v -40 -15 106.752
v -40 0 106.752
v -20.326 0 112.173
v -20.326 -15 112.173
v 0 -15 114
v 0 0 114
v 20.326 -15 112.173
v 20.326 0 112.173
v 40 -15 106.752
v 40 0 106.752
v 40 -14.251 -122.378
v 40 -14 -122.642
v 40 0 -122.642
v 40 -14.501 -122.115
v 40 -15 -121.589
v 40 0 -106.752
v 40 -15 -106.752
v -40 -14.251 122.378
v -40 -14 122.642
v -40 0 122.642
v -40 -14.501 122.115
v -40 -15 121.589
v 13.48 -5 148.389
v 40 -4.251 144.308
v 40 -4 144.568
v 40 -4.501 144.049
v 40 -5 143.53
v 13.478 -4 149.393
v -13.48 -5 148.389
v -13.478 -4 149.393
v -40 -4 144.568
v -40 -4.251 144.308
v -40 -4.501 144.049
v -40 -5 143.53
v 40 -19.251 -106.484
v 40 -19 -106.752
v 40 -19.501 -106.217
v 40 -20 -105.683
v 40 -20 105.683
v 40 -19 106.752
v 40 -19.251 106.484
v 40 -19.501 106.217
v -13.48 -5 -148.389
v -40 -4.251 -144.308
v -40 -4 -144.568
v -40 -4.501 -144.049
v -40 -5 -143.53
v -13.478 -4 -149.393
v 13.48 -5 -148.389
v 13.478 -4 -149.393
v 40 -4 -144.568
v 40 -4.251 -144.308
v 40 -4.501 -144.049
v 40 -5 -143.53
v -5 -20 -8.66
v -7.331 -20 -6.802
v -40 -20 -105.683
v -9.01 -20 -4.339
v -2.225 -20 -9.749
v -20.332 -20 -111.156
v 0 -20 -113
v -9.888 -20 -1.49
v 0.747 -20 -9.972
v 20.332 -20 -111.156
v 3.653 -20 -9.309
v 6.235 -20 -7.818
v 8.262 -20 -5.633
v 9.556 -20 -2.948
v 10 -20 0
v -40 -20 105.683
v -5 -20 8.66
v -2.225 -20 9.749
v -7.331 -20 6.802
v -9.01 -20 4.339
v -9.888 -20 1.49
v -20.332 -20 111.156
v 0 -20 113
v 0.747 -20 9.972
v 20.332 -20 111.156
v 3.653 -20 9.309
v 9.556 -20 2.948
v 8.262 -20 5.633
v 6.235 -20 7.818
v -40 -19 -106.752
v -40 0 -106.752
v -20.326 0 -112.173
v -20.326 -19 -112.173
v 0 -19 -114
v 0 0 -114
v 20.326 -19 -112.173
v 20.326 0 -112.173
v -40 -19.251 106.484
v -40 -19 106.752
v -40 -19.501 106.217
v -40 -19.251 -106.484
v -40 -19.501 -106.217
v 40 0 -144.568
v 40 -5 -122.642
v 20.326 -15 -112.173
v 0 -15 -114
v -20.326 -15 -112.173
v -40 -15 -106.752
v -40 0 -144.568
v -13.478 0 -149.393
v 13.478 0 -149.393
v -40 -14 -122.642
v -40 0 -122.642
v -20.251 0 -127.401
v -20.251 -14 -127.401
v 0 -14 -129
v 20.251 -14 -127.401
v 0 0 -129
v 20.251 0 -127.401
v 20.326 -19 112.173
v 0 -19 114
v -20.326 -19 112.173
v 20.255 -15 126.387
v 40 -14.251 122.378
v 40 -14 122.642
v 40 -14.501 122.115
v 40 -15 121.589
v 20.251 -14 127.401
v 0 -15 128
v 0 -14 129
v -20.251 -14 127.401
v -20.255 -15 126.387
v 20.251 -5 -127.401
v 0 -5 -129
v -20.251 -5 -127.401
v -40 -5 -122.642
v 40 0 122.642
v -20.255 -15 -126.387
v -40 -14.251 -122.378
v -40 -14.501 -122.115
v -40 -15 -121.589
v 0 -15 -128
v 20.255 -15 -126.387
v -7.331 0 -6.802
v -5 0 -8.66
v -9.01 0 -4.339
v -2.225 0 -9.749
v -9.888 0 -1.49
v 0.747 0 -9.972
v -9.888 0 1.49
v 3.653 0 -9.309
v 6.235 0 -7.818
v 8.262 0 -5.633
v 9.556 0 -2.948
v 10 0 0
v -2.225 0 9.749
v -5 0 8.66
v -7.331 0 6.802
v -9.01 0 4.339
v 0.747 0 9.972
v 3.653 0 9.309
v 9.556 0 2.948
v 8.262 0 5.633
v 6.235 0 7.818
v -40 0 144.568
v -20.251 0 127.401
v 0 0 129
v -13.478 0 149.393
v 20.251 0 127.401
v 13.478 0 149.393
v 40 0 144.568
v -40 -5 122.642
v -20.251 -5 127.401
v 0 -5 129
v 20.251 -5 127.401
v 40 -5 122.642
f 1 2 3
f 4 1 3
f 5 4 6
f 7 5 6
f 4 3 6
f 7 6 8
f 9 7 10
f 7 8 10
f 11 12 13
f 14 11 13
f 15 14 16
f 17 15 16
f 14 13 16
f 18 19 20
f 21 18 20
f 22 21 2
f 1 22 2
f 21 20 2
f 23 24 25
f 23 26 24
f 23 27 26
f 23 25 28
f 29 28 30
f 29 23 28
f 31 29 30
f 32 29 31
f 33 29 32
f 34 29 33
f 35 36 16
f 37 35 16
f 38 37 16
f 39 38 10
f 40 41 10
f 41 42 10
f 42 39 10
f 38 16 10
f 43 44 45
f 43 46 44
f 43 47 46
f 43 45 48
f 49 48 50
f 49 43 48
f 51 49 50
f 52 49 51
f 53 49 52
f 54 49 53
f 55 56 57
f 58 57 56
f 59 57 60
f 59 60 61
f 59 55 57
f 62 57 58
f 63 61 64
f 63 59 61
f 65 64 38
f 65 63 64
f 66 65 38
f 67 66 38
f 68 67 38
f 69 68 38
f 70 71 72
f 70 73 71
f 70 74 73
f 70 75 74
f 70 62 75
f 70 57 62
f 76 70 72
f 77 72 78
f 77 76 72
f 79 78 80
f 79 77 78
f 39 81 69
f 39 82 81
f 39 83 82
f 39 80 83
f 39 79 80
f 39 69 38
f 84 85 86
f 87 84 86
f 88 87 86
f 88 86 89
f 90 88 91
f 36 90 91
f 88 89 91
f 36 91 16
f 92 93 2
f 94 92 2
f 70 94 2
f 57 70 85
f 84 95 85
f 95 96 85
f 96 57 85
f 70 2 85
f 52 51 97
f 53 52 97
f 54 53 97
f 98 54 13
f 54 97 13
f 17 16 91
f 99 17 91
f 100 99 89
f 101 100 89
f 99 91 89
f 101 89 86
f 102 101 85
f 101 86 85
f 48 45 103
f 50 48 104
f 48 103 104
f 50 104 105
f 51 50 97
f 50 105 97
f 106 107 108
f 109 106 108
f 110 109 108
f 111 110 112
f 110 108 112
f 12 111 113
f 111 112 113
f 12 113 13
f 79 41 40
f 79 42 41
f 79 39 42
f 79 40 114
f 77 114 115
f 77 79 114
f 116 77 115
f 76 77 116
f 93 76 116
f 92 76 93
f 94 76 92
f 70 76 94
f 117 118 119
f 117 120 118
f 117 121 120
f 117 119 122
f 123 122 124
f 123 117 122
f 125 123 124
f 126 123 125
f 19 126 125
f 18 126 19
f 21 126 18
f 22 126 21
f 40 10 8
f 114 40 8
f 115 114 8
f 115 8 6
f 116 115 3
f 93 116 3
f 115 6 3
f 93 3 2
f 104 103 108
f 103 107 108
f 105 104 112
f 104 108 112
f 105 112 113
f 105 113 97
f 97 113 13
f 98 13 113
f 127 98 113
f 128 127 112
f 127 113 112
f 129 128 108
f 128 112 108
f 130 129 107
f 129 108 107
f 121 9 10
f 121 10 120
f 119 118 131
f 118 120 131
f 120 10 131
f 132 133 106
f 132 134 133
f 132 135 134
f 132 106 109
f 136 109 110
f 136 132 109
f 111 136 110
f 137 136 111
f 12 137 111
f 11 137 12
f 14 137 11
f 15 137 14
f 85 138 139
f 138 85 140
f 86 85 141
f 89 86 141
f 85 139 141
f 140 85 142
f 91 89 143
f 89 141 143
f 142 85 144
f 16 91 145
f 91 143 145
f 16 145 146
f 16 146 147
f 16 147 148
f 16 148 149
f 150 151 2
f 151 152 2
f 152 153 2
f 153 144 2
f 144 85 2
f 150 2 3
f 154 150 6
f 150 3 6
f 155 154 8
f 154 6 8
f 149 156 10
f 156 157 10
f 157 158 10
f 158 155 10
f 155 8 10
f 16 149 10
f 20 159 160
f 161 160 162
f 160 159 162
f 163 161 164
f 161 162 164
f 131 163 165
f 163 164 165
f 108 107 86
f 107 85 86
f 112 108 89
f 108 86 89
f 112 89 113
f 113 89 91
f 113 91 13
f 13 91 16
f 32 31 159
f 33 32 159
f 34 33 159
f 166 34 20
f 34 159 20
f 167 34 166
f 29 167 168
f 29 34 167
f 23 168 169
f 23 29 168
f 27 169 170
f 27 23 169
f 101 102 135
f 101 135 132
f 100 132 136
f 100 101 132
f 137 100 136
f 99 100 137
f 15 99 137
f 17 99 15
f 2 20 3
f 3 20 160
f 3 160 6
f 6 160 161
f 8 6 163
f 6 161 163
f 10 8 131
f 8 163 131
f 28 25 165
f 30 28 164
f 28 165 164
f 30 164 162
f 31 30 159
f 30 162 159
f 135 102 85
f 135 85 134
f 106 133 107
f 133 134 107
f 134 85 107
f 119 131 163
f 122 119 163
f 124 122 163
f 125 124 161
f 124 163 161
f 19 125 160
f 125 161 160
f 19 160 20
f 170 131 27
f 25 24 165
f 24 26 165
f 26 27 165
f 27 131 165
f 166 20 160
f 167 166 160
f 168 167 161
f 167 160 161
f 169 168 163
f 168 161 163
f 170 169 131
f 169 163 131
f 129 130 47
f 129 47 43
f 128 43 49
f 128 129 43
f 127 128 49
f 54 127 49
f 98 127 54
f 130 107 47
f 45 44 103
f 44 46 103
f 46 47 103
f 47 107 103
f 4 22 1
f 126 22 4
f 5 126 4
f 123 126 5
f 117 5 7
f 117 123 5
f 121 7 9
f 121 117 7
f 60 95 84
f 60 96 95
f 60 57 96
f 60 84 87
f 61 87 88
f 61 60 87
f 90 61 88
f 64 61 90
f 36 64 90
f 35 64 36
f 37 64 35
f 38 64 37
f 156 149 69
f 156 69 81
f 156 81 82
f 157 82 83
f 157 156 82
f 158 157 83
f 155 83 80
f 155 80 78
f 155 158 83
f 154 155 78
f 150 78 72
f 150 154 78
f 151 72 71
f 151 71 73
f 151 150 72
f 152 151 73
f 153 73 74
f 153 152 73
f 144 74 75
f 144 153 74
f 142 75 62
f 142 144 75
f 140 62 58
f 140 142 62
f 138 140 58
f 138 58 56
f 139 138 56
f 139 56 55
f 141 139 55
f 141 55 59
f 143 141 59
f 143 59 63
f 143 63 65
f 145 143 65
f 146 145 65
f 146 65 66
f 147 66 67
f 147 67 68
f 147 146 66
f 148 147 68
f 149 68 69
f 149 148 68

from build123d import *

# Parameters (mm, degrees)
F1_DEPTH  = 5
F2_DEPTH  = 15
F0_R      = 10
F3_DEPTH  = 20
F4_DEPTH  = 25
F5_SIZE   = 1
F5_2_SIZE = 1
F5_3_SIZE = 1
F5_4_SIZE = 1
F5_5_SIZE = 1


with BuildPart() as f1:
    # F0 (on Front) → F1 (new body)
    with BuildSketch(Plane.XZ):
        with BuildLine():
            Line((40, 122.6417547167), (40, 144.568322948))
            ThreePointArc((40, 144.568322948), (0, 150), (-40, 144.568322948))
            Line((-40, 144.568322948), (-40, 122.6417547167))
            ThreePointArc((-40, 122.6417547167), (0, 129), (40, 122.6417547167))
        make_face()
    extrude(amount=F1_DEPTH)

    # F0 (on Front) → F4 (cut)
    with BuildSketch(Plane.XZ):
        Circle(F0_R)
    extrude(amount=F4_DEPTH, mode=Mode.SUBTRACT)

    # F5
    f5_edges = [f1.edges().sort_by_distance(p)[0] for p in [
        (0, -5, 150),
    ]]
    chamfer(f5_edges, length=F5_SIZE)


with BuildPart() as f1b:
    # F0 (on Front) → F1, piece 2 (new body)
    with BuildSketch(Plane.XZ):
        with BuildLine():
            ThreePointArc((-40, -144.568322948), (0, -150), (40, -144.568322948))
            Line((40, -144.568322948), (40, -122.6417547167))
            ThreePointArc((40, -122.6417547167), (0, -129), (-40, -122.6417547167))
            Line((-40, -122.6417547167), (-40, -144.568322948))
        make_face()
    extrude(amount=F1_DEPTH)

    # F5#5
    f5_5_edges = [f1b.edges().sort_by_distance(p)[0] for p in [
        (0, -5, -150),
    ]]
    chamfer(f5_5_edges, length=F5_5_SIZE)


with BuildPart() as f2:
    # F0 (on Front) → F2 (new body)
    with BuildSketch(Plane.XZ):
        with BuildLine():
            ThreePointArc((-40, -122.6417547167), (0, -129), (40, -122.6417547167))
            Line((40, -122.6417547167), (40, -106.7520491607))
            ThreePointArc((40, -106.7520491607), (0, -114), (-40, -106.7520491607))
            Line((-40, -106.7520491607), (-40, -122.6417547167))
        make_face()
    extrude(amount=F2_DEPTH)

    # F5#4
    f5_4_edges = [f2.edges().sort_by_distance(p)[0] for p in [
        (0, -15, -129),
    ]]
    chamfer(f5_4_edges, length=F5_4_SIZE)


with BuildPart() as f2b:
    # F0 (on Front) → F2, piece 2 (new body)
    with BuildSketch(Plane.XZ):
        with BuildLine():
            Line((40, 106.7520491607), (40, 122.6417547167))
            ThreePointArc((40, 122.6417547167), (0, 129), (-40, 122.6417547167))
            Line((-40, 122.6417547167), (-40, 106.7520491607))
            ThreePointArc((-40, 106.7520491607), (0, 114), (40, 106.7520491607))
        make_face()
    extrude(amount=F2_DEPTH)

    # F5#2
    f5_2_edges = [f2b.edges().sort_by_distance(p)[0] for p in [
        (0, -15, 129),
    ]]
    chamfer(f5_2_edges, length=F5_2_SIZE)


with BuildPart() as f3:
    # F0 (on Front) → F3 (new body)
    with BuildSketch(Plane.XZ):
        with BuildLine():
            Line((40, -106.7520491607), (40, 106.7520491607))
            ThreePointArc((40, 106.7520491607), (0, 114), (-40, 106.7520491607))
            Line((-40, 106.7520491607), (-40, -106.7520491607))
            ThreePointArc((-40, -106.7520491607), (0, -114), (40, -106.7520491607))
        make_face()
        Circle(F0_R, mode=Mode.SUBTRACT)
    extrude(amount=F3_DEPTH)

    # F5#3
    f5_3_edges = [f3.edges().sort_by_distance(p)[0] for p in [
        (0, -20, 114),
        (0, -20, -114),
    ]]
    chamfer(f5_3_edges, length=F5_3_SIZE)


solid = Compound([f1.part, f1b.part, f2.part, f2b.part, f3.part])
